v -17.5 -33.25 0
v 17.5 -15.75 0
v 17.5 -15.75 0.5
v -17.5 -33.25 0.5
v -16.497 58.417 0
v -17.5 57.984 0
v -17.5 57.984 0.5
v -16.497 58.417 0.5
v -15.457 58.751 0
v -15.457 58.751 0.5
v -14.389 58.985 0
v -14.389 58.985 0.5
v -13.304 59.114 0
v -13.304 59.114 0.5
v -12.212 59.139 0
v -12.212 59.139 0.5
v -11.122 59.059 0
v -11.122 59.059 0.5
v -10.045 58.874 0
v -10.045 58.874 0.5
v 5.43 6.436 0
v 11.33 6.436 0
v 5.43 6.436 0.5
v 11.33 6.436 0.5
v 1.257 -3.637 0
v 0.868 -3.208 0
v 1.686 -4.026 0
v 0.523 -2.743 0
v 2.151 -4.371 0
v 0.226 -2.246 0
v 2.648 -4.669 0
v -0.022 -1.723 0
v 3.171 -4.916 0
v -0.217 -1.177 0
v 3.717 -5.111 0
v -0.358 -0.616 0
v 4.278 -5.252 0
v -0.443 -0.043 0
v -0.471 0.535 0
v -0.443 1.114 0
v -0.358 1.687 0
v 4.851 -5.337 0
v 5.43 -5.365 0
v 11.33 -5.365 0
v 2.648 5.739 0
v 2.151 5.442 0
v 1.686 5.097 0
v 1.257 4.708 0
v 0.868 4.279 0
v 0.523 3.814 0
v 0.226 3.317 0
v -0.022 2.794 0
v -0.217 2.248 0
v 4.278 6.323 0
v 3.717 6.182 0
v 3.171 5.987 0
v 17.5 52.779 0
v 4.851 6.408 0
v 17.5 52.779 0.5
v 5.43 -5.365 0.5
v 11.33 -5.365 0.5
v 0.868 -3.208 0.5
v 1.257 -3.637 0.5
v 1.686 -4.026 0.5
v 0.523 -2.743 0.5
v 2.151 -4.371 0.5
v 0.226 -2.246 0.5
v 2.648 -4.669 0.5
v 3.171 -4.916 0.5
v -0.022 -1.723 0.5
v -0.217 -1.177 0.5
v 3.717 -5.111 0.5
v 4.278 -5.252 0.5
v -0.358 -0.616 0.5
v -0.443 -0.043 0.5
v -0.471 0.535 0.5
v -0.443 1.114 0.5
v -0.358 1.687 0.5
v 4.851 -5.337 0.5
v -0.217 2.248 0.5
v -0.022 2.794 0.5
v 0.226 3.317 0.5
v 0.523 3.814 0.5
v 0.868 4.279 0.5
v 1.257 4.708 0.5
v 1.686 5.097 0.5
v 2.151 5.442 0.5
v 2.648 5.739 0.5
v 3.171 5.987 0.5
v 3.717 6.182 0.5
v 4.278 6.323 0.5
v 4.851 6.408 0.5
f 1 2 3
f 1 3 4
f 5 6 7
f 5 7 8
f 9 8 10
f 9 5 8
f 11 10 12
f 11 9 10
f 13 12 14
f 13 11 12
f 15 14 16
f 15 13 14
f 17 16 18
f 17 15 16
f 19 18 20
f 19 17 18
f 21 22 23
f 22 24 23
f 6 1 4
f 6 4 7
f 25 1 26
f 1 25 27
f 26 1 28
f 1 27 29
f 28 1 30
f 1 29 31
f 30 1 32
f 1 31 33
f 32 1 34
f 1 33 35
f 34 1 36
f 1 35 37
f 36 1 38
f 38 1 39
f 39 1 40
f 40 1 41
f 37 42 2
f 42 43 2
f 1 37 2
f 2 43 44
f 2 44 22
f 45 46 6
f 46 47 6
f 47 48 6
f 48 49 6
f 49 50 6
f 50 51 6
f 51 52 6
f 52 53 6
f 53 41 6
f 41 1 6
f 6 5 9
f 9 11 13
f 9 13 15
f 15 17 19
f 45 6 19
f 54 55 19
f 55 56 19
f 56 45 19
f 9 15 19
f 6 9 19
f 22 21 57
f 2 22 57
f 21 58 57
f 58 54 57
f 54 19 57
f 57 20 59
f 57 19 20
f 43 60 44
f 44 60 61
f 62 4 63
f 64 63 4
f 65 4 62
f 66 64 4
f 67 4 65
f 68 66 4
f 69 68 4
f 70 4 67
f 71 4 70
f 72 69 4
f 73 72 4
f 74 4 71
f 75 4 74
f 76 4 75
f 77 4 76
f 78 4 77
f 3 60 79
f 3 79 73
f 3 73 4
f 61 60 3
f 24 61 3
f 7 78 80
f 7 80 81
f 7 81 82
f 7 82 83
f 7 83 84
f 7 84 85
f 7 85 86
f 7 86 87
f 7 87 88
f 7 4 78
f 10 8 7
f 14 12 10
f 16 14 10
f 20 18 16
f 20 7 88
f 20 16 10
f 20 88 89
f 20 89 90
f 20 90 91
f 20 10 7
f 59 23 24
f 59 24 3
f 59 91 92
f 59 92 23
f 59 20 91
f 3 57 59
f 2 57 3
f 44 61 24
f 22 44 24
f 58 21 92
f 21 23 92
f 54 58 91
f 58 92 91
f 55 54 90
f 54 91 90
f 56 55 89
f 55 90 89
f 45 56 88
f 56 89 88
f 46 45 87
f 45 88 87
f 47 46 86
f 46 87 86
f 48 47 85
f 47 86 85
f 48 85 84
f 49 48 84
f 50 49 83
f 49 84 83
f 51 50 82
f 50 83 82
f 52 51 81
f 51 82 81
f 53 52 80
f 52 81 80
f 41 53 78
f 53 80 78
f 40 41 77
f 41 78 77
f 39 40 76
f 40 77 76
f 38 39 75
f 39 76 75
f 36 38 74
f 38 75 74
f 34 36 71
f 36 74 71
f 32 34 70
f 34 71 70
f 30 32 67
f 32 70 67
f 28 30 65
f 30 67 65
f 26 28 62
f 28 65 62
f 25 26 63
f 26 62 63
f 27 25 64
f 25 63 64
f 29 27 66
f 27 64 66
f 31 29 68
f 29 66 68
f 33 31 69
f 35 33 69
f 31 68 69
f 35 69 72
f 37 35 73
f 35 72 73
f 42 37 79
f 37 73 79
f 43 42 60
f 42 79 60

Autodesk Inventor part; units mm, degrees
ref_plane "YZ Plane" through (0, 0, 0) normal (1, 0, 0) x (0, 1, 0)
ref_plane "XZ Plane" through (0, 0, 0) normal (0, 1, 0) x (-1, 0, 0)
ref_plane "XY Plane" through (0, 0, 0) normal (0, 0, 1) x (1, 0, 0)
sketch "Sketch1" plane through (0, 0, 0) normal (0, 0, 1) x (1, 0, 0)
  line L0 (-17.5, -33.2499) -> (-17.5, 57.9837) projected
  arc A0 (-10.0449, 58.8745) -> (-17.5, 57.9837) centre (-12.5, 47.7794) ccw projected
  line L1 (-10.0449, 58.8745) -> (17.5, 52.7794) projected
  line L2 (17.5, 52.7794) -> (17.5, -15.7501) projected
  line L3 (17.5, -15.7501) -> (-17.5, -33.2499) projected
  line L4 (0.5, 7.1892) -> (0.5, 22.231) projected
  line L5 (0.5, 22.231) -> (-5.8925, 22.231) projected
  line L6 (-5.8925, 22.231) -> (-5.8925, 7.1892) projected
  line L7 (-5.8925, 7.1892) -> (0.5, 7.1892) projected
  point P0 (0, 0)
extrude "Extrusion1" add sketch "Sketch1" along normal blind 0.5 contours L0 A0 L1 L2 L3 | L7 L6 L5 L4
sketch "Sketch2" plane through (0, 0, 0.5) normal (0, 0, 1) x (1, 0, 0)
  line L0 (-1.5084, -24.1362) -> (-5.5333, -16.0863) projected
  line L1 (-5.5333, -16.0863) -> (-14.5107, -20.575) projected
  line L2 (-14.5107, -20.575) -> (-10.1014, -29.3938) projected
  arc A0 (-17.5, -30.0139) -> (-14.6056, -31.8027) centre (-15.5, -30.0139) ccw projected
  line L3 (-17.5, -30.0139) -> (-17.5, -1.8864) projected
  line L4 (-17.5, -1.8864) -> (-7.5, -1.8864) projected
  line L5 (-7.5, -1.8864) -> (-7.5, 7.5751) projected
  line L6 (-7.5, 7.5751) -> (-8.8, 7.5751) projected
  line L7 (-8.8, 26.3195) -> (-8.8, 7.5751) projected
  spline S0 degree 3 poles (-14.2046, 28.2052) (-13.4118, 28.2052) (-12.6544, 28.0226) (-10.9379, 27.4679) (-9.855, 26.8958) (-8.8077, 26.3237) (-8.8038, 26.3216) (-8.8, 26.3195) knots -0.001308 -0.001308 -0.001308 -0.001308 0.187612 0.187612 0.544343 0.544343 0.545651 0.545651 0.545651 0.545651 projected
  line L8 (-14.2046, 28.2052) -> (-17.5, 28.2052) projected
  line L9 (-17.5, 28.2052) -> (-17.5, 31.9794) projected
  arc A1 (-17.5, 31.9794) -> (-4.376, 33.2499) centre (-12.5, 48.7499) ccw projected
  arc A2 (-4.376, 33.2499) -> (2.7674, 54.4137) centre (-12.5, 47.7794) ccw projected
  arc A3 (3.9006, 55.7887) -> (2.7674, 54.4137) centre (3.6845, 54.8123) ccw projected
  line L10 (3.9006, 55.7887) -> (16.7161, 52.9529) projected
  arc A4 (17.5, 51.9765) -> (16.7161, 52.9529) centre (16.5, 51.9765) ccw projected
  line L11 (-17.5, 57.9837) -> (-17.5, -33.2499) projected
  line L12 (-17.5, -33.2499) -> (17.5, -15.7501) projected
  line L13 (17.5, -15.7501) -> (17.5, 52.7794) projected
  line L14 (17.5, 52.7794) -> (-10.0449, 58.8745) projected
  arc A5 (-10.0449, 58.8745) -> (-17.5, 57.9837) centre (-12.5, 47.7794) ccw projected
  line L15 (5.1606, 7.0459) -> (-1.321, 3.6769)
  line L16 (4.7678, -6.2957) -> (11.3303, -6.2957)
  line L17 (11.3303, -6.2957) -> (11.3303, 7.0459)
  circle A6 centre (5.4296, 0.5354) radius 5.9007
  line L18 (5.4296, 0.5354) -> (11.3303, 0.5354)
  line L19 (11.3303, 0.5354) -> (11.3303, 6.4362)
  line L20 (11.3303, 6.4362) -> (5.4296, 6.4362)
  line L21 (5.4296, 6.4362) -> (5.4296, 0.5354)
  line L22 (11.3303, 0.5354) -> (5.4296, 0.5354)
  line L23 (5.4296, 0.5354) -> (5.4296, -5.3653)
  line L24 (5.4296, -5.3653) -> (11.3303, -5.3653)
  line L25 (11.3303, -5.3653) -> (11.3303, 0.5354)
  line L26 (17.5, 51.9765) -> (17.5, -14.6321) projected
  line L27 (17.5, -14.6321) -> (-1.4167, -24.7491) projected
  arc A7 (-1.4167, -24.7491) -> (-1.5084, -24.1362) centre (-2.4029, -24.5834) ccw projected
  line L28 (-10.1014, -29.3938) -> (-14.6056, -31.8027) projected
  point P0 (0, 0)
  point P1 (17.5, 7.0459)
  point P2 (17.5, -15.0638)
extrude "Extrusion2" cut sketch "Sketch2" against normal blind 10 contours L24 A6 L17 | A6 L20 L17 | L18 L21 A6 | A6 L23 L18 | A6 L21 L23
properties part number "pokrywa prawa" material "Aluminum 6061"
